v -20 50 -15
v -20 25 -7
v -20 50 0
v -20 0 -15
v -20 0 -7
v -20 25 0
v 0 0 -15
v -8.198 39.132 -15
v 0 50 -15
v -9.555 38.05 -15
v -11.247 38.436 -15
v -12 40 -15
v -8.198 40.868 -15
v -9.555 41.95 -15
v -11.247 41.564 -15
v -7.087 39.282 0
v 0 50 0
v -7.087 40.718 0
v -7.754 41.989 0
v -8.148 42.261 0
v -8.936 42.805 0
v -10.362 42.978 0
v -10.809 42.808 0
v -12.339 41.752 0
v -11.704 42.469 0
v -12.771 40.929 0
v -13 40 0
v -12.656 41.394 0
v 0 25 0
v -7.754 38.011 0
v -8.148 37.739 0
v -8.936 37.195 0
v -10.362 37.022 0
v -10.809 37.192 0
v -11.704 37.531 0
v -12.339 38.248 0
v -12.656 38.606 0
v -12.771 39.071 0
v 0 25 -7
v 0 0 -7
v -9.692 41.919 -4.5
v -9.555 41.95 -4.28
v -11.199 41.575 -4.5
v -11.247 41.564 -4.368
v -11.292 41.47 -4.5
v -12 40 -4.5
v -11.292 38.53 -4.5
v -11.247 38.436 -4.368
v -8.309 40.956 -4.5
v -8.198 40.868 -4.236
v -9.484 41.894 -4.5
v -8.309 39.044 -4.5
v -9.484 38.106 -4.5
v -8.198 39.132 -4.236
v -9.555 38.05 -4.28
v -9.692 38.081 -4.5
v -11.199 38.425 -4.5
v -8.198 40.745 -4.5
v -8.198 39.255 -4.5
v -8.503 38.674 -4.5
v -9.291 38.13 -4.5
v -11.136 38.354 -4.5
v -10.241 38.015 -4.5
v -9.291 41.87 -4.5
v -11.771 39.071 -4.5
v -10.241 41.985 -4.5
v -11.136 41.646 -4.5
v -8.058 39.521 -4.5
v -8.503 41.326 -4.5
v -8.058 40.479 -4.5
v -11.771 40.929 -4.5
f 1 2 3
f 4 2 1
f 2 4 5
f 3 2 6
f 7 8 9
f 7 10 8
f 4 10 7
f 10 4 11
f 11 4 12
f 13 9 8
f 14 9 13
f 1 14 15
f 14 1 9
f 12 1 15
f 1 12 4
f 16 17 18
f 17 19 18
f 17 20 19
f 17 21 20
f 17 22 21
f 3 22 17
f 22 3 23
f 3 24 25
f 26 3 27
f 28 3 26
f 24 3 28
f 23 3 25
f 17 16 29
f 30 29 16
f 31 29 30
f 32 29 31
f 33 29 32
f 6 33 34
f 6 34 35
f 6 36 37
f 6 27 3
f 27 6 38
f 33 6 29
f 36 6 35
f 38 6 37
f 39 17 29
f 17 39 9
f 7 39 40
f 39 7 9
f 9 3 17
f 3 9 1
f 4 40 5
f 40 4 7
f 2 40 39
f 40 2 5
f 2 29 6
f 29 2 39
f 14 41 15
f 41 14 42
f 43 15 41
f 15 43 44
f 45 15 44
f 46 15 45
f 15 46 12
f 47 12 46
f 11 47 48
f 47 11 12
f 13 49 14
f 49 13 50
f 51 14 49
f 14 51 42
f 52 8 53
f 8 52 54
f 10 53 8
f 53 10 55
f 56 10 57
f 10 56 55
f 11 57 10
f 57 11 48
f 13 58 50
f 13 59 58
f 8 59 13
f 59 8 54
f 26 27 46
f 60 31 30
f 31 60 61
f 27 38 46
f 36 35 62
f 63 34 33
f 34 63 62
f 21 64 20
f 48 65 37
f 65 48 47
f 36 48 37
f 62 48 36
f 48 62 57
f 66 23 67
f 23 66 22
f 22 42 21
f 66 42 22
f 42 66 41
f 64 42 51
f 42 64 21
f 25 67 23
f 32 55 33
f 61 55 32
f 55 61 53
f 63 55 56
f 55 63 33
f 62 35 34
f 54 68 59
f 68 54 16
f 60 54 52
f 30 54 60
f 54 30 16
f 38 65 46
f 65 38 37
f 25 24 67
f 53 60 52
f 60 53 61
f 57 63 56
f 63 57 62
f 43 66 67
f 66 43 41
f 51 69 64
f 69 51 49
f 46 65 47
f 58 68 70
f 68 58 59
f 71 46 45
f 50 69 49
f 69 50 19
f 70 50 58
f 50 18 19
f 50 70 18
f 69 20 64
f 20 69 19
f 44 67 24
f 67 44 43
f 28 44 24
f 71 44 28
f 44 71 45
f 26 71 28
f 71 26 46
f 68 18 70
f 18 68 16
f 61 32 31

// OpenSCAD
rotate([0, 180, 0])
difference() {
cube([20,50,15]);
    cube([20,25,7]);
    translate([10,40,0])
    cylinder(h = 50, r1 = 2, r2 = 2, center = true);
    translate([10,40,0])
        cylinder(h = 9, r1 = 4, r2 = 2, center = true);
    }   
